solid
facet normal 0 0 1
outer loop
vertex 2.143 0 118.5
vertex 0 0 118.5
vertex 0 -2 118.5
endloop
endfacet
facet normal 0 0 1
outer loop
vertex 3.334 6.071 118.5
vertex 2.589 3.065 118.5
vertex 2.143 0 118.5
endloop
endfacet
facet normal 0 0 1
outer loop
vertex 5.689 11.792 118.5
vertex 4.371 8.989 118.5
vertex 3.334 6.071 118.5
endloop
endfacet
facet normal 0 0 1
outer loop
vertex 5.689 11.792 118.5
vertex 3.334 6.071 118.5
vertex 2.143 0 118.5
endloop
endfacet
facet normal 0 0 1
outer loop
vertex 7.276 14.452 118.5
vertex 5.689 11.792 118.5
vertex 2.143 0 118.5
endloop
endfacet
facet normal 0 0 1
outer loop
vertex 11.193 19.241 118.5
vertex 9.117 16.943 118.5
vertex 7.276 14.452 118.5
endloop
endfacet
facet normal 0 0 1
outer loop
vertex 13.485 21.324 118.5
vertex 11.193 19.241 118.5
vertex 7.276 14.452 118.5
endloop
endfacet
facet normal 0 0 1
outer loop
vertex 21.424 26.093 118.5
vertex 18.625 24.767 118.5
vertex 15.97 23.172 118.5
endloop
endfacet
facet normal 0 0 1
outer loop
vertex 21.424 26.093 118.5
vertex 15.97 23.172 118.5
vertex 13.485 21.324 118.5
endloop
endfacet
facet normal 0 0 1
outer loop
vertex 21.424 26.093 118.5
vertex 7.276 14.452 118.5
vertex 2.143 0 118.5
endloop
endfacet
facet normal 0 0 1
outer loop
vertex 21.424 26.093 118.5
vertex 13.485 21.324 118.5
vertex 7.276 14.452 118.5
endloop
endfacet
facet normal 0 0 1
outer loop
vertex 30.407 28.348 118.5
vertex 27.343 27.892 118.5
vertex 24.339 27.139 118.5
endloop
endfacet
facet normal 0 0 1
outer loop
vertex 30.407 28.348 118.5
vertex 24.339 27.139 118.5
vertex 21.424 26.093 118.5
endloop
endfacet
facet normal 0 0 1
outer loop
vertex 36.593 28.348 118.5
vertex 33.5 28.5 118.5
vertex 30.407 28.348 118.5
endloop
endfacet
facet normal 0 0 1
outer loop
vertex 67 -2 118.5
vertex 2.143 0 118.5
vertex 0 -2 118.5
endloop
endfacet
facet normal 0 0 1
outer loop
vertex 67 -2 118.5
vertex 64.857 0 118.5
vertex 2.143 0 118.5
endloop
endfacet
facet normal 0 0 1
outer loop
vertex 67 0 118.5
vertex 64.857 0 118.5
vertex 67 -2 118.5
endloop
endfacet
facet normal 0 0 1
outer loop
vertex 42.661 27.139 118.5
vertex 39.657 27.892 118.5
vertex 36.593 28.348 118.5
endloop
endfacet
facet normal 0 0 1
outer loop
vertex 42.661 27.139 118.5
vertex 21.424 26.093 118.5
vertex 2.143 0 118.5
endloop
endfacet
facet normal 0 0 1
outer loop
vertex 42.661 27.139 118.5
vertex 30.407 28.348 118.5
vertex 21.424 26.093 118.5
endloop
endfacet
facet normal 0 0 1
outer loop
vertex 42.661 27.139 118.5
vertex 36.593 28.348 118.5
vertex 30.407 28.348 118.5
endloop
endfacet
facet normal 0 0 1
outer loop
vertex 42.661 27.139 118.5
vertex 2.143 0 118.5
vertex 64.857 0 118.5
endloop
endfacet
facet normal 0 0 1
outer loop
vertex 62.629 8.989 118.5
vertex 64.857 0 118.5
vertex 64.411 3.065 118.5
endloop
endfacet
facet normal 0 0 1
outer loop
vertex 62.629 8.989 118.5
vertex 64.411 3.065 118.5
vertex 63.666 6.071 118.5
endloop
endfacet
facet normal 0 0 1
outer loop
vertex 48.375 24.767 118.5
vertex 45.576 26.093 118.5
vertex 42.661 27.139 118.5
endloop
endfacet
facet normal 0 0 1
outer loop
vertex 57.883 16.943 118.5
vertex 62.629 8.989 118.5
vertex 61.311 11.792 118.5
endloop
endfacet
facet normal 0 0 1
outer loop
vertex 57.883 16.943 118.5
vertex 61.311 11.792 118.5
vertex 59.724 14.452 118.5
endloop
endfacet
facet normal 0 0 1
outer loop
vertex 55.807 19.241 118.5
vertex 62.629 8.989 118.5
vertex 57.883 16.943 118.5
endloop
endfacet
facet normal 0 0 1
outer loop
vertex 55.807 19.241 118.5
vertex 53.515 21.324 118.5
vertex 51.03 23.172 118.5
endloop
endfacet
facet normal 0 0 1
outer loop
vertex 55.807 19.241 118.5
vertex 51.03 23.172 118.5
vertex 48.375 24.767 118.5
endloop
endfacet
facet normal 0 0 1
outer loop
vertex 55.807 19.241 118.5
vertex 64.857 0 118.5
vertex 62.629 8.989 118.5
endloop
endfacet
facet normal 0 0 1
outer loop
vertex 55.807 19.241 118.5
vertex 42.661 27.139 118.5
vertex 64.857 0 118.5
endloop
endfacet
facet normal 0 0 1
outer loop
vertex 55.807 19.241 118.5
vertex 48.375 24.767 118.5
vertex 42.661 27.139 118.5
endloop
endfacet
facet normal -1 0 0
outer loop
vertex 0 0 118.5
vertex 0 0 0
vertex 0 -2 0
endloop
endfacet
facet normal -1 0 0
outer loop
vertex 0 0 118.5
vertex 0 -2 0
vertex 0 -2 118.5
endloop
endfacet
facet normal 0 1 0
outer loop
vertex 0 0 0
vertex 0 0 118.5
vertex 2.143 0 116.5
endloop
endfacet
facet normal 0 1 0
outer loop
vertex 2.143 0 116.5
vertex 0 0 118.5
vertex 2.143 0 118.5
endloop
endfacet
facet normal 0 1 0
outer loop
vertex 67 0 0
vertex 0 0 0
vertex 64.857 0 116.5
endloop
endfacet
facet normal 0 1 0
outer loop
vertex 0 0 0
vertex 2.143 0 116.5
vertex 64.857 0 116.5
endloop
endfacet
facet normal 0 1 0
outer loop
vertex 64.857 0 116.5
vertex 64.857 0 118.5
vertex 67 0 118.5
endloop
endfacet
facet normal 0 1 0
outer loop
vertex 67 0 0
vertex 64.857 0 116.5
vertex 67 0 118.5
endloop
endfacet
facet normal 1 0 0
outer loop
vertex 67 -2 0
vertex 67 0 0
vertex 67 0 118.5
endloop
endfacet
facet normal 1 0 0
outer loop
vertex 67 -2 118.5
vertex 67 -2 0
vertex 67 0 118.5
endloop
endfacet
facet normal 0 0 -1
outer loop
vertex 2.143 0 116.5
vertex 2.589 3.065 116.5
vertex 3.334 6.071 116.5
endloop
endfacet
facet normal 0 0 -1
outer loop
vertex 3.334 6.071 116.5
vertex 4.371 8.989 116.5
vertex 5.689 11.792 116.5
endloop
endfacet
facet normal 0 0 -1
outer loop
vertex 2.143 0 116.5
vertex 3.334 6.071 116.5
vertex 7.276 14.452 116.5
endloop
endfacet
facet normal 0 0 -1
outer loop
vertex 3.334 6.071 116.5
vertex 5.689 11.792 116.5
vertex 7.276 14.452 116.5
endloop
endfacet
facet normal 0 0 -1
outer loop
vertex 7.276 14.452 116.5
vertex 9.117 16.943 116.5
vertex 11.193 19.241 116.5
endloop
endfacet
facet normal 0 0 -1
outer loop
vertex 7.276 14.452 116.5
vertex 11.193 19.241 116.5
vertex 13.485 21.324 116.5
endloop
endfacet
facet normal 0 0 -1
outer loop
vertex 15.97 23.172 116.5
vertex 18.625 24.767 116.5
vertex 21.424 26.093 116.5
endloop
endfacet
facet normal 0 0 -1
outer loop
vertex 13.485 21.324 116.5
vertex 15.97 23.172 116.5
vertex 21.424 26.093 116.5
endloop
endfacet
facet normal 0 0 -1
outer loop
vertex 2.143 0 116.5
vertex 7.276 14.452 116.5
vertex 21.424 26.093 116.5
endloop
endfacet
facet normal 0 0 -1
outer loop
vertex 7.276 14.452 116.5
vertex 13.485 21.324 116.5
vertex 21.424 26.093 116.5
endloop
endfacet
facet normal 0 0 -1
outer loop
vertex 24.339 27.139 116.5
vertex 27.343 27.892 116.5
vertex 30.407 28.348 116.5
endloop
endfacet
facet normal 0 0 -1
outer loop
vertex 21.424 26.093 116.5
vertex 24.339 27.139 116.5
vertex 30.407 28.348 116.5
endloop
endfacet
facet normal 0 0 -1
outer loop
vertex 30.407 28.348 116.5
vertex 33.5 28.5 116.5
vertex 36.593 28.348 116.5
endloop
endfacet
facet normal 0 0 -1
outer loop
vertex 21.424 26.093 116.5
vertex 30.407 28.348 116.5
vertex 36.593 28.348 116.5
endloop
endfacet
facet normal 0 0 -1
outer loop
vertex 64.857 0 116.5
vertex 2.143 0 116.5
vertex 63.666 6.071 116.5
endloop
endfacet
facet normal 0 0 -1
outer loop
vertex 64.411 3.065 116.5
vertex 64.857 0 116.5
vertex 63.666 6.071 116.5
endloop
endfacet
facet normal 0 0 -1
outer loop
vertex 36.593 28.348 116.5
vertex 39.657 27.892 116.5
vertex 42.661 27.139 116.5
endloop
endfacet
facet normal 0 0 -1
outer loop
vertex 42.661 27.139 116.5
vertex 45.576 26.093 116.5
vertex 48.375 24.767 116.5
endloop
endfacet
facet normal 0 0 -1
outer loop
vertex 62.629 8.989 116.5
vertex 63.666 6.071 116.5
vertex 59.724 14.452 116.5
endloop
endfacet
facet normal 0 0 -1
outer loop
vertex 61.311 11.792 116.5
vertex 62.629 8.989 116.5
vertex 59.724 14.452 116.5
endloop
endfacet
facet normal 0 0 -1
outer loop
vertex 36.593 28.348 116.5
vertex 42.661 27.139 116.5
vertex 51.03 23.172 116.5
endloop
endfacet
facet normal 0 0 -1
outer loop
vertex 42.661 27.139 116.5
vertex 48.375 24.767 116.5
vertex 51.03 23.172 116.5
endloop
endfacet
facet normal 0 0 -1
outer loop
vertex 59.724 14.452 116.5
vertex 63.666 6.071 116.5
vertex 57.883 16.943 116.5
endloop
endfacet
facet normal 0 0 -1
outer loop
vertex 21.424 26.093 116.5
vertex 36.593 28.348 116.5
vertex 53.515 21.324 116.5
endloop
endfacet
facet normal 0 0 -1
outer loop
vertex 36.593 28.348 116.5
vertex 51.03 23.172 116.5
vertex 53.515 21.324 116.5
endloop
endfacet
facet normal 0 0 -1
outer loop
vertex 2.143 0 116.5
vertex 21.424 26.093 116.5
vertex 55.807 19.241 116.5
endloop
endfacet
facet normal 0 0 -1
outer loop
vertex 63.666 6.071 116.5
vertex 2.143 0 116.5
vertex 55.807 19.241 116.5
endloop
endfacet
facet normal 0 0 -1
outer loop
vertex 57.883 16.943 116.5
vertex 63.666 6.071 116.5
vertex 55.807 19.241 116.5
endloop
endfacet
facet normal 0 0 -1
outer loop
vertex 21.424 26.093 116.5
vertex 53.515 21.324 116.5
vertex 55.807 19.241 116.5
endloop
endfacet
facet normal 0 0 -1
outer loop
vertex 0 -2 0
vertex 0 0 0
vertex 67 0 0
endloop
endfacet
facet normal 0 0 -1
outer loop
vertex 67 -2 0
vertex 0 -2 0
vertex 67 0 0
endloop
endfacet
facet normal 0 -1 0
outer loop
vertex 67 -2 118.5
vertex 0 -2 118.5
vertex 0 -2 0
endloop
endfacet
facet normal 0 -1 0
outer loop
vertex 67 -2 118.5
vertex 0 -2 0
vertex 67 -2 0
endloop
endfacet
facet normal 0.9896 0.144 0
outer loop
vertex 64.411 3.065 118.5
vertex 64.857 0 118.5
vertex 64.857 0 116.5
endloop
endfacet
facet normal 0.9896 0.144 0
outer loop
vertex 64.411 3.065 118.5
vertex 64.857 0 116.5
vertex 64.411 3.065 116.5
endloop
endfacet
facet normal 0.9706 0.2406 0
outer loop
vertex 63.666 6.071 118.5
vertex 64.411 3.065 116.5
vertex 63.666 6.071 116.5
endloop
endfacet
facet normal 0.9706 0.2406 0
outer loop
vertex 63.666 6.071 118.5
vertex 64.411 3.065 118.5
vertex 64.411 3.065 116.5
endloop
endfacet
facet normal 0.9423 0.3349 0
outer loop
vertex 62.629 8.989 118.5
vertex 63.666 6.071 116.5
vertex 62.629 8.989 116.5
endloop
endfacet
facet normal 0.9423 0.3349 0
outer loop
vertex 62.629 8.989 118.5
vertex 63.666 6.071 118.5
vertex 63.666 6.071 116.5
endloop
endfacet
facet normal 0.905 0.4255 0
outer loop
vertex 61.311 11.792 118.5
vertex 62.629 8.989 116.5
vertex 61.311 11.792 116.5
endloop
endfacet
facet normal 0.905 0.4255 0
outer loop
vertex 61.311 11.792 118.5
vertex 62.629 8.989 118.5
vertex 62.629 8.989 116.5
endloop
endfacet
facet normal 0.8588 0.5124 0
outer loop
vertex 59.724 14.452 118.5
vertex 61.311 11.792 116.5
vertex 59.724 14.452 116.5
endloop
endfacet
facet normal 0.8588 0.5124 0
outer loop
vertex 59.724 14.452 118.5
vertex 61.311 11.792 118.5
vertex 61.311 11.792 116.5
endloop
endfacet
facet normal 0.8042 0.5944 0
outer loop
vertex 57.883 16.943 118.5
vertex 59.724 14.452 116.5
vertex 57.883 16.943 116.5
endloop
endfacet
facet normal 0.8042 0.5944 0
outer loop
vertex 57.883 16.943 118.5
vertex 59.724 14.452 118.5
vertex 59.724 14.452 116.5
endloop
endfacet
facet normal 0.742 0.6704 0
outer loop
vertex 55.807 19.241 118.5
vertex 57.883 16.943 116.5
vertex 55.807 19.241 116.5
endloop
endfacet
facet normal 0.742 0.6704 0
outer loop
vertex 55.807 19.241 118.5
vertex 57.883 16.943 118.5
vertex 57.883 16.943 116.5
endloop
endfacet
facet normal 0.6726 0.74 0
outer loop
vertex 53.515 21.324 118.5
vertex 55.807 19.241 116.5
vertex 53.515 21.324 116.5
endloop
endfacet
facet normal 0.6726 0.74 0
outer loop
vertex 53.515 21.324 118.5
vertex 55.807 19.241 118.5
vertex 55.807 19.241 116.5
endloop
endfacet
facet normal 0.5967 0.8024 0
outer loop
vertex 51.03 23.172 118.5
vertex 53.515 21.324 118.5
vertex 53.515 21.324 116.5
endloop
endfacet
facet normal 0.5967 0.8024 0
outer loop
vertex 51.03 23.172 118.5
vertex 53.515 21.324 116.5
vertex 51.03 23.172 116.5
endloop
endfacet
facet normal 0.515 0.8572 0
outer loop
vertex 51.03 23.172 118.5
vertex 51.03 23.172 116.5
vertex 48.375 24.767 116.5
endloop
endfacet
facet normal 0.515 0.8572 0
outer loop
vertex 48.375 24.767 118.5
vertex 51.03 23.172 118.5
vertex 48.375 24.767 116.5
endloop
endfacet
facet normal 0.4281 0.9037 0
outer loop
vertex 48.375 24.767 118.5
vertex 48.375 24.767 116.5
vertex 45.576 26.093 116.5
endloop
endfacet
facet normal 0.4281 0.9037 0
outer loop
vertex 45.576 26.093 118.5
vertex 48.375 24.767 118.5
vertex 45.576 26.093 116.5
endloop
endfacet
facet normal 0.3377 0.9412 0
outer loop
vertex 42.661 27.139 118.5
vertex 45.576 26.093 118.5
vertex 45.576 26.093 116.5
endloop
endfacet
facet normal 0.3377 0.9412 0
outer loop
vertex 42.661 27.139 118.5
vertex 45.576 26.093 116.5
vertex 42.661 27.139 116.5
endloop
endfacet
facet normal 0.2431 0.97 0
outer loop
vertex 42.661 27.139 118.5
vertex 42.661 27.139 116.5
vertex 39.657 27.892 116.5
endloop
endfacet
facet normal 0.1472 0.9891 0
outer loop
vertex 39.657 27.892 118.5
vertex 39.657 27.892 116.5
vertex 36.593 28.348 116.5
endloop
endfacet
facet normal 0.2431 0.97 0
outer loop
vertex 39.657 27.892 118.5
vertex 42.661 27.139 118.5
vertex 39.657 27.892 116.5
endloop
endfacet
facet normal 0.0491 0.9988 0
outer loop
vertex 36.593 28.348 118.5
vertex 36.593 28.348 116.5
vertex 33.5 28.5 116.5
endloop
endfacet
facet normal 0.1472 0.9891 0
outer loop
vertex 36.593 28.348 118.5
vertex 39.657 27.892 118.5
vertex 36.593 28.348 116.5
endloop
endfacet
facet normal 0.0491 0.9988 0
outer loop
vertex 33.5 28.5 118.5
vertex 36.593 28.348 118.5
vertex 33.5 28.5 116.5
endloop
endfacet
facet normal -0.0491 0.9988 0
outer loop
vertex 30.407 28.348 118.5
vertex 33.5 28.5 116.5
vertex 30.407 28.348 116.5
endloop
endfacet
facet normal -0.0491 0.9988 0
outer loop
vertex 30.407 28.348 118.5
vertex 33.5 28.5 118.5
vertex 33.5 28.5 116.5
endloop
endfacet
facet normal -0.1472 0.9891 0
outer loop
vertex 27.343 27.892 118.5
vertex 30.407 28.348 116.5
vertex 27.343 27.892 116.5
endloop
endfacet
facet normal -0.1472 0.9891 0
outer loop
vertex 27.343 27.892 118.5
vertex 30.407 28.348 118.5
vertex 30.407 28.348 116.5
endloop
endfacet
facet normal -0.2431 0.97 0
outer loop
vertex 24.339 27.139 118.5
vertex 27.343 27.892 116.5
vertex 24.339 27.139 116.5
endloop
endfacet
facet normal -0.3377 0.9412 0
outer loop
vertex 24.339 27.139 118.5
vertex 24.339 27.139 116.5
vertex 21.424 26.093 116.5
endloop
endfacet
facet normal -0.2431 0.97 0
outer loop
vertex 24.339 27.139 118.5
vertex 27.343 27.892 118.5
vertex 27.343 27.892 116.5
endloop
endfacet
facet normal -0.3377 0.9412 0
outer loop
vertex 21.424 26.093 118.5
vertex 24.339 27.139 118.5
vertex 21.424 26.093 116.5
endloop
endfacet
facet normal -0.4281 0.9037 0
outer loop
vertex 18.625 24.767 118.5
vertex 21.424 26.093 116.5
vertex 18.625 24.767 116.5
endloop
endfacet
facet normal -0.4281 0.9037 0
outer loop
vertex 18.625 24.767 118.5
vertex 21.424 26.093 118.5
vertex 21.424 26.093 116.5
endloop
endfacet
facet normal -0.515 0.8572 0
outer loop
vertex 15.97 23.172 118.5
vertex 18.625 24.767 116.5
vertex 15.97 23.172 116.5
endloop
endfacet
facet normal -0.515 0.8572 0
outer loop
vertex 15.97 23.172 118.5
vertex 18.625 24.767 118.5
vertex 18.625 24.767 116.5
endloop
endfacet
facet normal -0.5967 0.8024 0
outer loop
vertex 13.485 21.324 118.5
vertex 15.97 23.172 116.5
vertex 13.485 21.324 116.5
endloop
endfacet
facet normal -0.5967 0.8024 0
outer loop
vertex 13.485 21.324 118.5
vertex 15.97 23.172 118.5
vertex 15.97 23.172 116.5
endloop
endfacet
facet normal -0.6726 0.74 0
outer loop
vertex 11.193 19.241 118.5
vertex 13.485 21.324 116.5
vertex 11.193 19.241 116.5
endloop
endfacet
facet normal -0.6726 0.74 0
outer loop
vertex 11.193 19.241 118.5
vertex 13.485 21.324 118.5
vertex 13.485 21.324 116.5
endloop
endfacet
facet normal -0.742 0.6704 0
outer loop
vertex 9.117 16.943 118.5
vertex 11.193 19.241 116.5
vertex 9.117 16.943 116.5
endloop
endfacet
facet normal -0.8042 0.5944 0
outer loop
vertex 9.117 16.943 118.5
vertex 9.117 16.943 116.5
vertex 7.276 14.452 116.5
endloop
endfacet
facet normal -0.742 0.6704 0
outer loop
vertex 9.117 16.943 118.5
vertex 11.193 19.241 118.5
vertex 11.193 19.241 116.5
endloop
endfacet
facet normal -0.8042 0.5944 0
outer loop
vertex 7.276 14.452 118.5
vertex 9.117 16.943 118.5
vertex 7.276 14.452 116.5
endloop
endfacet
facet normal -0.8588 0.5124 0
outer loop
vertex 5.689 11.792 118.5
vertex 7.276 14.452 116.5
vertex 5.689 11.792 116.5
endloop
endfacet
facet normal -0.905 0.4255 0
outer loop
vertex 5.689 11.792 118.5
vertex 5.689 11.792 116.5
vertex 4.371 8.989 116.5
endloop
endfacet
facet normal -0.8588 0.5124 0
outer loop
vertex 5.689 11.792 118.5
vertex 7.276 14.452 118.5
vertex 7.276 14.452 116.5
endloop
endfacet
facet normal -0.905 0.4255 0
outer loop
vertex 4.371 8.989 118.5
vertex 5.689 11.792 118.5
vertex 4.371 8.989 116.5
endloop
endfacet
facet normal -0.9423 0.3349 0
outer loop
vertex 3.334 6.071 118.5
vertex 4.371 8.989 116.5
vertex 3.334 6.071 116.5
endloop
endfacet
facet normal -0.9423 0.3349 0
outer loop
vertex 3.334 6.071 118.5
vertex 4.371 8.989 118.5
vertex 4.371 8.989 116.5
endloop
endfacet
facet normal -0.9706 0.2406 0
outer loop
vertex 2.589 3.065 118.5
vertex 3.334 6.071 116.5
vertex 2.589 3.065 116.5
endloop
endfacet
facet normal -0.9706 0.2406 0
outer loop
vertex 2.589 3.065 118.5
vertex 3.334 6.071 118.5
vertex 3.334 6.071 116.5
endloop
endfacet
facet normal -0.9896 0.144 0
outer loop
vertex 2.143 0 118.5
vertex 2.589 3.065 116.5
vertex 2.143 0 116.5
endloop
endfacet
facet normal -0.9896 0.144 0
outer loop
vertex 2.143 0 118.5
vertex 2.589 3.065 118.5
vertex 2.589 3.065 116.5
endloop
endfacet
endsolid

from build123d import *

# Parameters (mm, degrees)
F0_W     = 67
F0_H     = 118.5
F1_DEPTH = 2
F3_DEPTH = 2


with BuildPart() as f1:
    # F0 (on Front) → F1 (new body)
    with BuildSketch(Plane.XZ):
        with Locations((33.5, 59.25)):
            Rectangle(F0_W, F0_H)
    extrude(amount=F1_DEPTH)

    # F2 (on face) → F3 (join)
    with BuildSketch(Plane.XY.offset(118.5)):
        with BuildLine():
            Line((2.143183, 0), (64.856817, 0))
            ThreePointArc((64.856817, 0), (33.5, 28.5), (2.143183, 0))
        make_face()
        with BuildLine():
            Line((2.015877, -2), (64.984123, -2))
            ThreePointArc((64.984123, -2), (64.936379, -0.998987), (64.856817, 0))
            Line((64.856817, 0), (2.143183, 0))
            ThreePointArc((2.143183, 0), (2.063621, -0.998987), (2.015877, -2))
        make_face()
    extrude(amount=-F3_DEPTH)


solid = f1.part
